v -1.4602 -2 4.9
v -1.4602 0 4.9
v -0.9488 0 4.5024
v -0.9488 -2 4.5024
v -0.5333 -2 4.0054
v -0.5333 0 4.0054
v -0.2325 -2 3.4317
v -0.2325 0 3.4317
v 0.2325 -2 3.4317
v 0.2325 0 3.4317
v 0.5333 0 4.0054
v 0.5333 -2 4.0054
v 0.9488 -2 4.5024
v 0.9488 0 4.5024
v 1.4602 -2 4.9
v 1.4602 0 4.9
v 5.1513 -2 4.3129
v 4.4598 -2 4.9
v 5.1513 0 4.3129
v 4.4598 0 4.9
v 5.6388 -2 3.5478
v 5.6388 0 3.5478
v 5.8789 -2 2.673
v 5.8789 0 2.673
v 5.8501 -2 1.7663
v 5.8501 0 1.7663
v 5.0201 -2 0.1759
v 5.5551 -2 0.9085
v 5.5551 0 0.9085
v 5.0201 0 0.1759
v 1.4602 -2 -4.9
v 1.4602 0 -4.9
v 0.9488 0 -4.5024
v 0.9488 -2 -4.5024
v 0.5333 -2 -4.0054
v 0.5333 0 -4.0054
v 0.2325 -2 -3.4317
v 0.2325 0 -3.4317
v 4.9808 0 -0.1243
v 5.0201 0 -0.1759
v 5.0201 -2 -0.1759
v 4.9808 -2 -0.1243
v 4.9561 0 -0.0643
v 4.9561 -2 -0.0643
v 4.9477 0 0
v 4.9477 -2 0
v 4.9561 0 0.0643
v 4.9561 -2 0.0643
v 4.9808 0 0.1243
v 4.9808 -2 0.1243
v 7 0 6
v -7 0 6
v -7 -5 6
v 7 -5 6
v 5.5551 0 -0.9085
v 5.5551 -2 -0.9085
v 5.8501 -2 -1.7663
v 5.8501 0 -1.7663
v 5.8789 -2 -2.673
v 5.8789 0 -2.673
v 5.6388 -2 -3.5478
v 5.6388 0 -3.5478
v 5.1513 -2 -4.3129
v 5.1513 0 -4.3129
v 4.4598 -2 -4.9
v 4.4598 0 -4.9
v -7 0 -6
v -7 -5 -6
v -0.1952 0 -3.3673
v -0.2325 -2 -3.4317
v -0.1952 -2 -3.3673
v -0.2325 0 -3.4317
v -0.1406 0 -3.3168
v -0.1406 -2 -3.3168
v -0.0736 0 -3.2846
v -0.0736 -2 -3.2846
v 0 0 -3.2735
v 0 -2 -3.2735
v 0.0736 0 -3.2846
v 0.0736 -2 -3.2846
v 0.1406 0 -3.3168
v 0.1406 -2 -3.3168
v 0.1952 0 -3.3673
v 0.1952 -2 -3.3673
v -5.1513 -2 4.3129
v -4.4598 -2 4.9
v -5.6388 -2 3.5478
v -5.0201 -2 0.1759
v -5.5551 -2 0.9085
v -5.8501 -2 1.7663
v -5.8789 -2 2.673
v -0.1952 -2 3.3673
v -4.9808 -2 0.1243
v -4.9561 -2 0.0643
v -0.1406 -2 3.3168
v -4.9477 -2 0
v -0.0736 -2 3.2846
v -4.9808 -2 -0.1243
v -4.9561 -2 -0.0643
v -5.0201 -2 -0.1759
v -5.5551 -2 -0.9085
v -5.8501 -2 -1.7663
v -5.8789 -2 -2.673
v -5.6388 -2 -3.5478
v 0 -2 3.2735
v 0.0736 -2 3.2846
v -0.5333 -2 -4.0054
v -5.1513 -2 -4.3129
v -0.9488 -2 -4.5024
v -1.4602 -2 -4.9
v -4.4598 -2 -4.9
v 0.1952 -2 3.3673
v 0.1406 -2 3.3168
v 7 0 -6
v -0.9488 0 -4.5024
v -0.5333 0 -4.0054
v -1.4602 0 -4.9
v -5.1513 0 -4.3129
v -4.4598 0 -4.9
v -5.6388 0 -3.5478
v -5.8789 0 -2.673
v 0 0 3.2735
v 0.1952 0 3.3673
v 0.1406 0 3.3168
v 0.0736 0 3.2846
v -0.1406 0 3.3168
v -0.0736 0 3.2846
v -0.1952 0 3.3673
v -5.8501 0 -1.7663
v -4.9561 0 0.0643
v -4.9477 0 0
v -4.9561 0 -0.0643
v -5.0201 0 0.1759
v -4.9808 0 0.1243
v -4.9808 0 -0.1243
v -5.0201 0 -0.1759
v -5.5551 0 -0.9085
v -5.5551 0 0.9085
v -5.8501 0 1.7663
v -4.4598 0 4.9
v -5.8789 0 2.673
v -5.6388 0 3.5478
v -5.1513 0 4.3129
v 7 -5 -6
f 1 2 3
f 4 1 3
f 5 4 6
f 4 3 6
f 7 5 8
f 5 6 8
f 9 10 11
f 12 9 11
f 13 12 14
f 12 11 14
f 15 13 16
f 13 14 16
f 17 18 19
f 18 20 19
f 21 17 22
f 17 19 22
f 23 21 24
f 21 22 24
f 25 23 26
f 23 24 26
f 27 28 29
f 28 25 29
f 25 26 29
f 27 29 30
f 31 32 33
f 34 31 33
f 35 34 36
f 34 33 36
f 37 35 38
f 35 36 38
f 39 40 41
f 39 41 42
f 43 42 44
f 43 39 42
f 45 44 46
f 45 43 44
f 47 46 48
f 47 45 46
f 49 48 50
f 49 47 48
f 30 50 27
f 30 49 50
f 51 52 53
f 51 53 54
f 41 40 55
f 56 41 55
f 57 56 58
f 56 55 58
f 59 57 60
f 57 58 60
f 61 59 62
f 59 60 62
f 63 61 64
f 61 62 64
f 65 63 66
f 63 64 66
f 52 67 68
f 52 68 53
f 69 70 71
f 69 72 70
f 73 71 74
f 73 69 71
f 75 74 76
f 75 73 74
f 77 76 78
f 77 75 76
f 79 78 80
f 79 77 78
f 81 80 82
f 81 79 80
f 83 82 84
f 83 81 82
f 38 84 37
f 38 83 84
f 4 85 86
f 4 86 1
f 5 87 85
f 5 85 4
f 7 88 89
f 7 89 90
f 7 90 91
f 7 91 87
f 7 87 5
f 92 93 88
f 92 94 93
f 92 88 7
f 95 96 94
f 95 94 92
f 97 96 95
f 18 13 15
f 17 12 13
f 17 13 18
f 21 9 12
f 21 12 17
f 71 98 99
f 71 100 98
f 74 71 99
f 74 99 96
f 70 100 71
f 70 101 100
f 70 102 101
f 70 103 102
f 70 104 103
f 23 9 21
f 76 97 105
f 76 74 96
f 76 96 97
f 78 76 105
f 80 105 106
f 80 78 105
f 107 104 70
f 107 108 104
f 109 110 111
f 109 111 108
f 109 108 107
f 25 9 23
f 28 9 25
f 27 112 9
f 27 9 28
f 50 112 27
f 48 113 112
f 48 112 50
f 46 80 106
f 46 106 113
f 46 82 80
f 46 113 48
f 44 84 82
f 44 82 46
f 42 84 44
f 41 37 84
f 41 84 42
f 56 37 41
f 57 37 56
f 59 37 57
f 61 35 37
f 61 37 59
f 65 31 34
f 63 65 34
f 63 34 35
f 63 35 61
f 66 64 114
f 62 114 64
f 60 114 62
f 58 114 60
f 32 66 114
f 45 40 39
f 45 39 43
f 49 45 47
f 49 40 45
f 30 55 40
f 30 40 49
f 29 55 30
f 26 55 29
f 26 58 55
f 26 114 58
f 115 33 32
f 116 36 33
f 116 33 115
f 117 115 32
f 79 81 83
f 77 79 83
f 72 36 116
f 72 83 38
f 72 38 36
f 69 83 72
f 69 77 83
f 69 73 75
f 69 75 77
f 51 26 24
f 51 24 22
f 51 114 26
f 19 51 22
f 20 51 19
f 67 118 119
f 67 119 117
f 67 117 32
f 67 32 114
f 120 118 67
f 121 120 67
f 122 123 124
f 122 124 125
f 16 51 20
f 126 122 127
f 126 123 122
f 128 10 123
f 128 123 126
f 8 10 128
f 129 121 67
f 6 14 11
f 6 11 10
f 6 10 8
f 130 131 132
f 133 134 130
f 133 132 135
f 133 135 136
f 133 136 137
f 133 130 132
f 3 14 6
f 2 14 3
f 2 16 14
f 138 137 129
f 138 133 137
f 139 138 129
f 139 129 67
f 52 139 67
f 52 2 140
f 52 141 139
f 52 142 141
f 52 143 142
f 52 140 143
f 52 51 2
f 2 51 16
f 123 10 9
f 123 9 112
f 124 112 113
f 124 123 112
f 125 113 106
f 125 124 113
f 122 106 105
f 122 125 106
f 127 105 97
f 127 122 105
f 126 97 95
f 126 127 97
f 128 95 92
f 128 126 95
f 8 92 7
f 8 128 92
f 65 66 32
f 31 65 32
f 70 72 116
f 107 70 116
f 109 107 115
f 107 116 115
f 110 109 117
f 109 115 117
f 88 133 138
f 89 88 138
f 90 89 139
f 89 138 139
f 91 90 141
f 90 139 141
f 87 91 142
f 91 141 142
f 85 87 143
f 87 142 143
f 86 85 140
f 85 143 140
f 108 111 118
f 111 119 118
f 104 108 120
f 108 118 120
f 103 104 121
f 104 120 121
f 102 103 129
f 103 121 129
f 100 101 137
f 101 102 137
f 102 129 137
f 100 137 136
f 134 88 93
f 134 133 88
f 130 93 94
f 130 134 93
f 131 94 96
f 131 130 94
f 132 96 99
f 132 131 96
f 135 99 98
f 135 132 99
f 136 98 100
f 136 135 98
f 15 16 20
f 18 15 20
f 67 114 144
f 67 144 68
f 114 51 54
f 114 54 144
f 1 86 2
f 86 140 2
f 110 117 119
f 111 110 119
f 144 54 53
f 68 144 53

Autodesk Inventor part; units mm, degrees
ref_plane "YZ Plane" through (0, 0, 0) normal (1, 0, 0) x (0, 1, 0)
ref_plane "XZ Plane" through (0, 0, 0) normal (0, 1, 0) x (-1, 0, 0)
ref_plane "XY Plane" through (0, 0, 0) normal (0, 0, 1) x (1, 0, 0)
sketch "Sketch1" plane through (0, 0, 0) normal (0, 1, 0) x (-1, 0, 0)
  line L0 (7, 6) -> (-7, 6)
  line L1 (-7, 6) -> (-7, -6)
  line L2 (-7, -6) -> (7, -6)
  line L3 (7, -6) -> (7, 6)
  line L4 (7, 6) -> (-7, -6) construction
  line L5 (-7, 6) -> (7, -6) construction
  line L6 (4.3106, 4.4) -> (1.6094, 4.4) construction
  line L7 (1.6094, 4.4) -> (1.6094, 0.23) construction
  line L8 (1.6094, 0.23) -> (4.3106, 0.23) construction
  line L9 (4.3106, 0.23) -> (4.3106, 4.4) construction
  line L10 (4.3106, 4.4) -> (1.6094, 0.23) construction
  line L11 (1.6094, 4.4) -> (4.3106, 0.23) construction
  arc A0 (4.3106, 0.23) -> (4.3106, 4.4) centre (2.86, 2.315) ccw construction
  arc A1 (1.6094, 4.4) -> (1.6094, 0.23) centre (3.06, 2.315) ccw construction
  point P0 (0, 0)
  point P1 (2.96, 2.315)
  dimension "d0" = 12
  dimension "d1" = 14
  dimension "d2" = 4.17
  dimension "d3" = 2.54
  dimension "d4" = 4.88
  dimension "d6" = 1.6
  dimension "d7" = 1.6
extrude "Extrusion1" add sketch "Sketch1" against normal blind 5
sketch "Sketch2" plane through (0, 0, 0) normal (0, 1, 0) x (1, 0, 0)
  line L0 (-4.3106, -4.4) -> (-1.6094, -4.4) construction
  arc A0 (-4.3106, -0.23) -> (-4.3106, -4.4) centre (-2.86, -2.315) ccw construction
  arc A1 (-1.6094, -4.4) -> (-1.6094, -0.23) centre (-3.06, -2.315) ccw construction
  arc A2 (-4.8304, 0) -> (-4.4598, -4.9) centre (-2.86, -2.315) ccw
  line L1 (-4.4598, -4.9) -> (-1.4602, -4.9)
  arc A3 (-1.4602, -4.9) -> (-0.02, -2.315) centre (-3.06, -2.315) ccw
  line L2 (-7, 6) -> (-7, -6) projected
  line L3 (-7, -6) -> (7, -6) projected
  line L4 (-4.8304, 0) -> (-6.4599, 0)
  line L5 (-6.4599, 0) -> (-6.4599, -5.558) construction
  line L6 (-6.4599, -5.558) -> (0, -5.558) construction
  line L7 (0, -5.558) -> (0, -2.315) construction
  line L8 (0, -2.315) -> (-0.02, -2.315)
  line L9 (0, 8.4) -> (0, -8.4) projected
  line L10 (0, -2.315) -> (0, 0)
  line L11 (-4.8304, 0) -> (0, 0)
  dimension "d10" = 0.5
extrude "Extrusion2" cut sketch "Sketch2" against normal blind 2
mirror "Mirror1" about plane through (0, 0, 0) normal (0, 0, 1) of "Extrusion2"
mirror "Mirror2" about plane through (0, 0, 0) normal (1, 0, 0) of "Extrusion2", "Mirror1"
fillet "Fillet1" radius 0.25 6 edges at (-4.8304, -1, 0) (0.02, -1, 2.315) (0.02, -1, -2.315) (-0.02, -1, 2.315) (-0.02, -1, -2.315) (4.8304, -1, 0)
properties part number "ldr_case"
